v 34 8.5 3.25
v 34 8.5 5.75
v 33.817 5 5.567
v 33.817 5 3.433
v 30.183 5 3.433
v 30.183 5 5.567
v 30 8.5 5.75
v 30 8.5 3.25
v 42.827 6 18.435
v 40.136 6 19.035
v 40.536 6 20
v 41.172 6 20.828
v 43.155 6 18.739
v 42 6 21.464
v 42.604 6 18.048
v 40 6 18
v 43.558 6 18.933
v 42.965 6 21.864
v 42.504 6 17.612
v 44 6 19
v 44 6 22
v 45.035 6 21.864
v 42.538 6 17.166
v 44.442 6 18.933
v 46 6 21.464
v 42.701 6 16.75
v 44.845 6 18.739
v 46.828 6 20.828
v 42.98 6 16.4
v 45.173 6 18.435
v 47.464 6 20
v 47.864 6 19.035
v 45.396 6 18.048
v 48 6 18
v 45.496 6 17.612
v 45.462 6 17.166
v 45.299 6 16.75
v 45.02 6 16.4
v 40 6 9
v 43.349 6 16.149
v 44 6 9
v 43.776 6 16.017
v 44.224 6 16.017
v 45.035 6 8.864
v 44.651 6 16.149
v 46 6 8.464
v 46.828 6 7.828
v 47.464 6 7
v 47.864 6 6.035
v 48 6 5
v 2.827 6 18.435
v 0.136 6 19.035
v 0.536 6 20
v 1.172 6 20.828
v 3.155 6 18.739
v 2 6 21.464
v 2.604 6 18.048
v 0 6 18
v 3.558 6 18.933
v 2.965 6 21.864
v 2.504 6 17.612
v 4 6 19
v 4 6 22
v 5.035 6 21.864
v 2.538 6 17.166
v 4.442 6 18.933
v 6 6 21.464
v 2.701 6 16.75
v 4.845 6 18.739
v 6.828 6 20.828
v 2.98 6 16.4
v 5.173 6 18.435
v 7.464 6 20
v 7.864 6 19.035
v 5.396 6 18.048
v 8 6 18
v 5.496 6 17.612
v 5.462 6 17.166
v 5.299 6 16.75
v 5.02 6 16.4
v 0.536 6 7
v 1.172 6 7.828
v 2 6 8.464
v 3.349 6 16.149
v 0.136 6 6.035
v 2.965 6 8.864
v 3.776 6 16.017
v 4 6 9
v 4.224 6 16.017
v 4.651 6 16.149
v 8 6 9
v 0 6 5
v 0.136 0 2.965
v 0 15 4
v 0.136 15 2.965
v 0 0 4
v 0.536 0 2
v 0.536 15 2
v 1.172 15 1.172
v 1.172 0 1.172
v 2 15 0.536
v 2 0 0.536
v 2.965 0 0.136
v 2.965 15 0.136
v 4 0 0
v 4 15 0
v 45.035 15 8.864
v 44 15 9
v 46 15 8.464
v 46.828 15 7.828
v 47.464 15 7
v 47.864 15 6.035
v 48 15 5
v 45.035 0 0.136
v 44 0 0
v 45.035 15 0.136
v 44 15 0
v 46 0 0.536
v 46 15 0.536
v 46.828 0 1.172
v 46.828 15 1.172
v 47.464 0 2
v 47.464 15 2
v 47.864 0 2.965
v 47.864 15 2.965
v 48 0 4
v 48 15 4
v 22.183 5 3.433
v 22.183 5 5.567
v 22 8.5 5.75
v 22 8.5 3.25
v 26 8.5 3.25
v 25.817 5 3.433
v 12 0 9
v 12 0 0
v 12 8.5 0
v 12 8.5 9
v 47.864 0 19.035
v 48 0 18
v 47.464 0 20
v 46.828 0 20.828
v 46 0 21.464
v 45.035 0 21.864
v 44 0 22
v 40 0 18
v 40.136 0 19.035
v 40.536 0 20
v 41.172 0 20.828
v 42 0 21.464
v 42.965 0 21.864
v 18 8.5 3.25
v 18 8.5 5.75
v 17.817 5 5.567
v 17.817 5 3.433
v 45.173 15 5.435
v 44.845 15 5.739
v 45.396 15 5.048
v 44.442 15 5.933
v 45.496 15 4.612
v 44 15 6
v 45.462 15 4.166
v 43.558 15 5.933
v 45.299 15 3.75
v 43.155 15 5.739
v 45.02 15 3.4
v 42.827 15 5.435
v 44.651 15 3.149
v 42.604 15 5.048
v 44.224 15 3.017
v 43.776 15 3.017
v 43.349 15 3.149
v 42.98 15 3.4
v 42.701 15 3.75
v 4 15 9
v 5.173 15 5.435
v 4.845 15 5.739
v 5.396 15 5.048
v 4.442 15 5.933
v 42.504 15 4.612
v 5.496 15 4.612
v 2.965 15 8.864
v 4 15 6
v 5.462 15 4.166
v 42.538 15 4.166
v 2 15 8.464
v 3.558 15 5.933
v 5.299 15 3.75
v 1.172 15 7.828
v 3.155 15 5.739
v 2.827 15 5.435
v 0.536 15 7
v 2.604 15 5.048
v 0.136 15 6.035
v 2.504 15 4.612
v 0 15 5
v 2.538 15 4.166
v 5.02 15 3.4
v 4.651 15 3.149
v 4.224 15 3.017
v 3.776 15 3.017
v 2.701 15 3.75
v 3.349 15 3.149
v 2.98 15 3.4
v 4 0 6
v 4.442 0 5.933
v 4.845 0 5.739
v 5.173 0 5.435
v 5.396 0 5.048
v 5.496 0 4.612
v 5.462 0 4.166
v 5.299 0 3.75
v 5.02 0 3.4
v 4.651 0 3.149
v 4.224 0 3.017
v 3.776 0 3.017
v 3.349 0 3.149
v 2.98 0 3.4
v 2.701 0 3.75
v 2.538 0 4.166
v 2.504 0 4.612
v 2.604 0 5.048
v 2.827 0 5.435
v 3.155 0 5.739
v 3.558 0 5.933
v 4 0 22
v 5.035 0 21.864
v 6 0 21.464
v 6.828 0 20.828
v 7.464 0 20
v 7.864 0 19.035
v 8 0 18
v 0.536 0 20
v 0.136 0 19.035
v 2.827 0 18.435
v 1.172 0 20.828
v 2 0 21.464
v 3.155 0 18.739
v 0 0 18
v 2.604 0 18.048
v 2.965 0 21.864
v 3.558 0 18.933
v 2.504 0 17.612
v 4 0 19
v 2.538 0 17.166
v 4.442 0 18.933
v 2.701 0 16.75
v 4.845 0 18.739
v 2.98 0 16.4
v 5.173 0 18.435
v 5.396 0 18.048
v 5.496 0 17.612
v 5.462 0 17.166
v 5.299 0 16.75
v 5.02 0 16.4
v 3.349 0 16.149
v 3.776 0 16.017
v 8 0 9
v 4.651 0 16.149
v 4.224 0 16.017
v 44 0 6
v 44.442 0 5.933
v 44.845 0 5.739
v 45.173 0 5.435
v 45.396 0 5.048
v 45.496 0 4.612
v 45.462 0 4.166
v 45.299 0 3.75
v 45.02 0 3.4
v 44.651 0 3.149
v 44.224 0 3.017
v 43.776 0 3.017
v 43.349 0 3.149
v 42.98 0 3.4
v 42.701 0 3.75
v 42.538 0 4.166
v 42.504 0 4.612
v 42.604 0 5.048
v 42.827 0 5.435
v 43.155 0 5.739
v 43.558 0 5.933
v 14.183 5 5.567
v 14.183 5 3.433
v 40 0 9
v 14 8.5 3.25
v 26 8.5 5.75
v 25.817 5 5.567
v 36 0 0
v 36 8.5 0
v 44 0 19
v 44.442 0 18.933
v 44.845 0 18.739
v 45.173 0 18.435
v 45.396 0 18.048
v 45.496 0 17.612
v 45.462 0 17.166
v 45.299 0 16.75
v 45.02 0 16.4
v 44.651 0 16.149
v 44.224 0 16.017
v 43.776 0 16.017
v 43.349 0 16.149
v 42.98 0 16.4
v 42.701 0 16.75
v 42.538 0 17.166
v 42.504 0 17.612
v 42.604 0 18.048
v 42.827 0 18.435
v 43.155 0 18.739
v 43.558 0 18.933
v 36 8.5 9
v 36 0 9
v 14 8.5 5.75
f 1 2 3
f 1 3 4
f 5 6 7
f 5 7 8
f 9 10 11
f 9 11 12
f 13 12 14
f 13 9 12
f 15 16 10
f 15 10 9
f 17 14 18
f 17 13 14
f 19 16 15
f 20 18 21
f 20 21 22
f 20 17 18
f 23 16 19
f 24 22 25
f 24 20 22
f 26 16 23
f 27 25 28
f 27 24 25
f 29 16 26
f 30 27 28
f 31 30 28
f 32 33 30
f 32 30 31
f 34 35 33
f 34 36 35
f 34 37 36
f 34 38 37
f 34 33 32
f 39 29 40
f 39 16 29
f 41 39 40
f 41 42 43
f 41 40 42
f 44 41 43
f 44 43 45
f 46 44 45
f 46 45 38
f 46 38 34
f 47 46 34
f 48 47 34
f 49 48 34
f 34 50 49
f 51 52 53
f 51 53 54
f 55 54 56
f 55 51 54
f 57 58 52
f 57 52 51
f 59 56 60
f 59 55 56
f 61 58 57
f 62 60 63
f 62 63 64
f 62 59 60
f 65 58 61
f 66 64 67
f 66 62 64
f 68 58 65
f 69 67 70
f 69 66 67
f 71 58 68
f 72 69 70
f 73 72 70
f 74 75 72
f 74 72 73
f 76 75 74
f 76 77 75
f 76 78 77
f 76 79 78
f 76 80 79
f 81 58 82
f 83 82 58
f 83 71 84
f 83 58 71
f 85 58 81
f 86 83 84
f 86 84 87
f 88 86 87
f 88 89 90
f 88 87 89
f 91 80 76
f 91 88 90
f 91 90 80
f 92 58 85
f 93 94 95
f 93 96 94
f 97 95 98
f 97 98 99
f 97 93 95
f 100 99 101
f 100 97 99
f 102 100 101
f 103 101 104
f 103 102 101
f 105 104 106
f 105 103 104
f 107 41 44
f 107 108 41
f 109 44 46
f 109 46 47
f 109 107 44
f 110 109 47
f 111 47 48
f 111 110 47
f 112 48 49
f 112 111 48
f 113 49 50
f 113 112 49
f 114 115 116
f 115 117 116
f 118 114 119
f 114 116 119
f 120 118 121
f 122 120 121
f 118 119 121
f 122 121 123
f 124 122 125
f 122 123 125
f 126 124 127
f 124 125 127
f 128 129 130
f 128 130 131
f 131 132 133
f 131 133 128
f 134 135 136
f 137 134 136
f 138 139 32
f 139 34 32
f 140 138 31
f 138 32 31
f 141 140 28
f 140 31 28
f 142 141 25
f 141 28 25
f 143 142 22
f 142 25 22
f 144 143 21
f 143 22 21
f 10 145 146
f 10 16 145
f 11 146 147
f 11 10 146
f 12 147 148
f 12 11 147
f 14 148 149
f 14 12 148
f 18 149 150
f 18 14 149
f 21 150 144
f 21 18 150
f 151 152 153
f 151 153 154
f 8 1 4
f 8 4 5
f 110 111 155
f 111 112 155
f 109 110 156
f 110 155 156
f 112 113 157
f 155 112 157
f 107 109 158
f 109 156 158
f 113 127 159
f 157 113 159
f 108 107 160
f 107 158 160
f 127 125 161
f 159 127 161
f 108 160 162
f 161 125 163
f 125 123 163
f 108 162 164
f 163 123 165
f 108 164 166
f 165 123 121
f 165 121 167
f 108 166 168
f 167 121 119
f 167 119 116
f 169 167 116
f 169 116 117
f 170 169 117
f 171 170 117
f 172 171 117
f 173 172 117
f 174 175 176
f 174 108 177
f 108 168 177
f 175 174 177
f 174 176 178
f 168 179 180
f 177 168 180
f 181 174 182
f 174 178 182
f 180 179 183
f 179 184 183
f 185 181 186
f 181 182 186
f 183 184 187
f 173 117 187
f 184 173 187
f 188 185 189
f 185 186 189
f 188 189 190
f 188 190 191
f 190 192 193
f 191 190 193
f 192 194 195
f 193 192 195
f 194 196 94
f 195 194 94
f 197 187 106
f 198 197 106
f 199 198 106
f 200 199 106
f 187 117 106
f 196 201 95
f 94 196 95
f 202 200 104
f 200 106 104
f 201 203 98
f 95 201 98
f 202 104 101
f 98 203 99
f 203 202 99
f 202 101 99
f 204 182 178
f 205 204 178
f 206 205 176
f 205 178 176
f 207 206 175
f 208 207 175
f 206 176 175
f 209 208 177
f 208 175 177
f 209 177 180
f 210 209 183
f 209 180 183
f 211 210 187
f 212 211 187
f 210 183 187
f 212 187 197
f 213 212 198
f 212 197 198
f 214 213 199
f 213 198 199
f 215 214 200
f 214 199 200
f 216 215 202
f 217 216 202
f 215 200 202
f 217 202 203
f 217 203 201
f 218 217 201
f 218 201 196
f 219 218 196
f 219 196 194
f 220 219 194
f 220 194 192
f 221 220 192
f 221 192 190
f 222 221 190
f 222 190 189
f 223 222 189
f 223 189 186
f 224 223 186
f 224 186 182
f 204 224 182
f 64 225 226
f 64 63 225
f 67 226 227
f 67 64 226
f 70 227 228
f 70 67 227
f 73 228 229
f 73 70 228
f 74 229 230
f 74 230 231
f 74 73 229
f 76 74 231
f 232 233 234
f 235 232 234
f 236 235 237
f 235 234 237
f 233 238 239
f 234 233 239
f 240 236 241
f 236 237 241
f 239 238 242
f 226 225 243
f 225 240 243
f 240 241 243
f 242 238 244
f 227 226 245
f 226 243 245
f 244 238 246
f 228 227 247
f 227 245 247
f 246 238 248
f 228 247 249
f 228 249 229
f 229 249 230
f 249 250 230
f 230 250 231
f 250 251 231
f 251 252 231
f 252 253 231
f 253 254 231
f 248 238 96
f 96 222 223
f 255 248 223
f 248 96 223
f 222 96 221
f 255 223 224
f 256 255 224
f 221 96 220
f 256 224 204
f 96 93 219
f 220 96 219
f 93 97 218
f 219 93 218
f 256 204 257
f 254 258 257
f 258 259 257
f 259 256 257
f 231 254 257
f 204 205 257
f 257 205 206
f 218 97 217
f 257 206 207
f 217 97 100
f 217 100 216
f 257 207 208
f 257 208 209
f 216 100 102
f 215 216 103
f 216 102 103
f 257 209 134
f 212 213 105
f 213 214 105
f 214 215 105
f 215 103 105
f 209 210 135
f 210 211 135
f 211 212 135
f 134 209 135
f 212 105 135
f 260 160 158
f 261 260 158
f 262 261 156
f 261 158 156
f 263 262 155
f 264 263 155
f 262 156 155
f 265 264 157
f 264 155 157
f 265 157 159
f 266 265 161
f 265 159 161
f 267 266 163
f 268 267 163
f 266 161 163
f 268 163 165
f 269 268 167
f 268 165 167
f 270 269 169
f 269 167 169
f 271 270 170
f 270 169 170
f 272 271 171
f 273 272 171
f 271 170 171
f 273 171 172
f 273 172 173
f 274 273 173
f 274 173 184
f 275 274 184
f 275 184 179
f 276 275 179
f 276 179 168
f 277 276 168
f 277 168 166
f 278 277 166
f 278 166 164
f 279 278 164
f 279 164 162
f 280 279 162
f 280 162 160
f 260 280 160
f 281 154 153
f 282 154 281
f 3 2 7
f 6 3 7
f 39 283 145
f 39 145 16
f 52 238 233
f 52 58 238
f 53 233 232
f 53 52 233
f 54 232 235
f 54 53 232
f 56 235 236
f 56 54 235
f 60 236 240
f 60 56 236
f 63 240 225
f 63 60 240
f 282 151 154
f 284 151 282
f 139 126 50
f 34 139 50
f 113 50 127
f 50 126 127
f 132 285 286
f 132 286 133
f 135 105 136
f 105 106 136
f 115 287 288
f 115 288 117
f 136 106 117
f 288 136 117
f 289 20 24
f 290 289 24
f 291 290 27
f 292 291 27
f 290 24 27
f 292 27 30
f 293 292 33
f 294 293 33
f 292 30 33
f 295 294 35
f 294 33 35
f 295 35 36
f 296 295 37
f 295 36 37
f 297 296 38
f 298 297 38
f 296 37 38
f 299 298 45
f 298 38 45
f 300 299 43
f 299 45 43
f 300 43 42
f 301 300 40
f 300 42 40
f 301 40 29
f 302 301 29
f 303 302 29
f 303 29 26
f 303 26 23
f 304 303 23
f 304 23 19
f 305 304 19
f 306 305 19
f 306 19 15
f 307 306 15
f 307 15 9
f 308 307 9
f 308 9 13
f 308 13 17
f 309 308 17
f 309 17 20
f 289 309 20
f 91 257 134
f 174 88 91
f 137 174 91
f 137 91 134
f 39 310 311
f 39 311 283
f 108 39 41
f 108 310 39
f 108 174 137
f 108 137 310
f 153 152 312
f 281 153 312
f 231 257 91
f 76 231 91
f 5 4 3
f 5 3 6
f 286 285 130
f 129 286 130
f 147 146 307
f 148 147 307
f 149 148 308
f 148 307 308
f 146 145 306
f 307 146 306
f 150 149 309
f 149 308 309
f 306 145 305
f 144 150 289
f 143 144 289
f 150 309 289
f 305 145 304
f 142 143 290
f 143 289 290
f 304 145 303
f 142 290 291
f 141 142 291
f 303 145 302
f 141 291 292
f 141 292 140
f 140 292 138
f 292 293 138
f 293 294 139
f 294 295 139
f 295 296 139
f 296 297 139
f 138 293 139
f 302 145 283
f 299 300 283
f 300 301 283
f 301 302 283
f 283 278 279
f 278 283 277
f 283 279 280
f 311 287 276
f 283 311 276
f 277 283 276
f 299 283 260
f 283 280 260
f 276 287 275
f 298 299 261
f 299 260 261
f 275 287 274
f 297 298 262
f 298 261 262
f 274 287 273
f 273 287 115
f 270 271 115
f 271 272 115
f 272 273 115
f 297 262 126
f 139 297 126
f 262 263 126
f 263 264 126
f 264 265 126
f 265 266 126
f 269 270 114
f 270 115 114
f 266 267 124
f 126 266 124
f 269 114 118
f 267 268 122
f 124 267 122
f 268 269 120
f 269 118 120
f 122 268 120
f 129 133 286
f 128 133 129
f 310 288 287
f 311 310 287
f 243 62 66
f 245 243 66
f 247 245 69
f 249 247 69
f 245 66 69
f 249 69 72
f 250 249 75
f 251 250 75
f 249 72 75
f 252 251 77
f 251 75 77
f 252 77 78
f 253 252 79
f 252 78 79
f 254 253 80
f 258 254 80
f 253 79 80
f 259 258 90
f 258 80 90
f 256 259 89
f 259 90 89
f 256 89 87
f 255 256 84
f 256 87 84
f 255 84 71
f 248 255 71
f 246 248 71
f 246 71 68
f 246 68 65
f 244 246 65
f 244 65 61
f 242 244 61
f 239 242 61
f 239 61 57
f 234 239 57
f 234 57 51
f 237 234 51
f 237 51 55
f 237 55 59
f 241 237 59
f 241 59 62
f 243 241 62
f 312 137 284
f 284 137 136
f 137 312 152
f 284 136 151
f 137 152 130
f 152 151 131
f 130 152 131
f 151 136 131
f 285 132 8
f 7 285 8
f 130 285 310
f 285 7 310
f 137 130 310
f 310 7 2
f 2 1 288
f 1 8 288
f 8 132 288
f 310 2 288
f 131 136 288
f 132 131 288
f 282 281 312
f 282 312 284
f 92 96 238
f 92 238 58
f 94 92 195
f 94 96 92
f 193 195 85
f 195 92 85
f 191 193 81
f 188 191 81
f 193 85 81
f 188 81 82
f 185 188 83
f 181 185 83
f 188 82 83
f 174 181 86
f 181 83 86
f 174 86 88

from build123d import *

# Parameters (mm, degrees)
BOSS_EXTRUDE1_DEPTH           = 9
SKETCH2_W                     = 4
SKETCH2_H                     = 2.5
BOSS_EXTRUDE2_DEPTH           = 3.5
BOSS_EXTRUDE2_DRAFT           = 3
BOSS_EXTRUDE2_PROFILE_2_DEPTH = 3.5
BOSS_EXTRUDE2_PROFILE_2_DRAFT = 3
BOSS_EXTRUDE2_PROFILE_3_DEPTH = 3.5
BOSS_EXTRUDE2_PROFILE_3_DRAFT = 3
SKETCH4_W                     = 8
SKETCH4_H                     = 6
BOSS_EXTRUDE4_DEPTH           = 13
SKETCH3_R                     = 1.5
CUT_EXTRUDE1_DEPTH            = 55.890800686
FILLET1_R                     = 4


with BuildPart() as part:
    # Sketch1 → Boss-Extrude1 (new body)
    with BuildSketch(Plane.XY):
        Polygon((0, 0), (12, 0), (12, 8.5), (36, 8.5), (36, 0), (48, 0), (48, 15), (0, 15), align=None)
    extrude(amount=BOSS_EXTRUDE1_DEPTH)


with BuildPart() as boss_extrude2_tool:
    # Sketch2 → Boss-Extrude2 (with draft: the straight prism first)
    with BuildSketch(Plane(origin=(0, 8.5, 0), x_dir=(-1, 0, 0), z_dir=(0, -1, 0))):
        with Locations((-16, -4.5)):
            Rectangle(SKETCH2_W, SKETCH2_H)
    extrude(amount=BOSS_EXTRUDE2_DEPTH)
    # Boss-Extrude2: the draft: its side faces are tilted about the plane it starts from
    boss_extrude2_sides = [boss_extrude2_tool.faces().sort_by_distance(p)[0] for p in [
        (14, 6.75, 4.5),
        (16, 6.75, 3.25),
        (18, 6.75, 4.5),
        (16, 6.75, 5.75),
    ]]
    draft(boss_extrude2_sides, Plane(origin=(0, 8.5, 0), x_dir=(-1, 0, 0), z_dir=(0, -1, 0)), BOSS_EXTRUDE2_DRAFT)


with BuildPart() as part_1:
    add(part.part)

    # Boss-Extrude2: add boss_extrude2_tool
    add(boss_extrude2_tool.part)


with BuildPart() as boss_extrude2_profile_2_tool:
    # Sketch2 → Boss-Extrude2 profile 2 (with draft: the straight prism first)
    with BuildSketch(Plane(origin=(0, 8.5, 0), x_dir=(-1, 0, 0), z_dir=(0, -1, 0))):
        with Locations((-24, -4.5)):
            Rectangle(SKETCH2_W, SKETCH2_H)
    extrude(amount=BOSS_EXTRUDE2_PROFILE_2_DEPTH)
    # Boss-Extrude2 profile 2: the draft: its side faces are tilted about the plane it starts from
    boss_extrude2_profile_2_sides = [boss_extrude2_profile_2_tool.faces().sort_by_distance(p)[0] for p in [
        (22, 6.75, 4.5),
        (24, 6.75, 3.25),
        (26, 6.75, 4.5),
        (24, 6.75, 5.75),
    ]]
    draft(boss_extrude2_profile_2_sides, Plane(origin=(0, 8.5, 0), x_dir=(-1, 0, 0), z_dir=(0, -1, 0)), BOSS_EXTRUDE2_PROFILE_2_DRAFT)


with BuildPart() as part_2:
    add(part_1.part)

    # Boss-Extrude2 profile 2: add boss_extrude2_profile_2_tool
    add(boss_extrude2_profile_2_tool.part)


with BuildPart() as boss_extrude2_profile_3_tool:
    # Sketch2 → Boss-Extrude2 profile 3 (with draft: the straight prism first)
    with BuildSketch(Plane(origin=(0, 8.5, 0), x_dir=(-1, 0, 0), z_dir=(0, -1, 0))):
        with Locations((-32, -4.5)):
            Rectangle(SKETCH2_W, SKETCH2_H)
    extrude(amount=BOSS_EXTRUDE2_PROFILE_3_DEPTH)
    # Boss-Extrude2 profile 3: the draft: its side faces are tilted about the plane it starts from
    boss_extrude2_profile_3_sides = [boss_extrude2_profile_3_tool.faces().sort_by_distance(p)[0] for p in [
        (30, 6.75, 4.5),
        (32, 6.75, 3.25),
        (34, 6.75, 4.5),
        (32, 6.75, 5.75),
    ]]
    draft(boss_extrude2_profile_3_sides, Plane(origin=(0, 8.5, 0), x_dir=(-1, 0, 0), z_dir=(0, -1, 0)), BOSS_EXTRUDE2_PROFILE_3_DRAFT)


with BuildPart() as part_3:
    add(part_2.part)

    # Boss-Extrude2 profile 3: add boss_extrude2_profile_3_tool
    add(boss_extrude2_profile_3_tool.part)

    # Sketch4 → Boss-Extrude4 (add)
    with BuildSketch(Plane.XY.offset(9)):
        with Locations((4, 3)):
            Rectangle(SKETCH4_W, SKETCH4_H)
        with Locations((44, 3)):
            Rectangle(SKETCH4_W, SKETCH4_H)
    extrude(amount=BOSS_EXTRUDE4_DEPTH)

    # Sketch3 → Cut-Extrude1 (cut, through all)
    with BuildSketch(Plane(origin=(0, 15, 0), x_dir=(1, 0, 0), z_dir=(0, 1, 0))):
        with Locations(Location((4, -4.5, 0), (0, 0, 270))):
            Circle(SKETCH3_R)
        with Locations(Location((44, -4.5, 0), (0, 0, 270))):
            Circle(SKETCH3_R)
        with Locations(Location((4, -17.5, 0), (0, 0, 270))):
            Circle(SKETCH3_R)
        with Locations(Location((44, -17.5, 0), (0, 0, 270))):
            Circle(SKETCH3_R)
    extrude(amount=-CUT_EXTRUDE1_DEPTH, mode=Mode.SUBTRACT)

    # Fillet1
    fillet1_edges = [part_3.edges().sort_by_distance(p)[0] for p in [
        (40, 3, 22),
        (48, 3, 22),
        (48, 7.5, 0),
        (48, 10.5, 9),
        (0, 3, 22),
        (8, 3, 22),
        (0, 7.5, 0),
        (0, 10.5, 9),
    ]]
    fillet(fillet1_edges, radius=FILLET1_R - 0.0001)  # a hair under: the kernel refuses the full size


solid = part_3.part
